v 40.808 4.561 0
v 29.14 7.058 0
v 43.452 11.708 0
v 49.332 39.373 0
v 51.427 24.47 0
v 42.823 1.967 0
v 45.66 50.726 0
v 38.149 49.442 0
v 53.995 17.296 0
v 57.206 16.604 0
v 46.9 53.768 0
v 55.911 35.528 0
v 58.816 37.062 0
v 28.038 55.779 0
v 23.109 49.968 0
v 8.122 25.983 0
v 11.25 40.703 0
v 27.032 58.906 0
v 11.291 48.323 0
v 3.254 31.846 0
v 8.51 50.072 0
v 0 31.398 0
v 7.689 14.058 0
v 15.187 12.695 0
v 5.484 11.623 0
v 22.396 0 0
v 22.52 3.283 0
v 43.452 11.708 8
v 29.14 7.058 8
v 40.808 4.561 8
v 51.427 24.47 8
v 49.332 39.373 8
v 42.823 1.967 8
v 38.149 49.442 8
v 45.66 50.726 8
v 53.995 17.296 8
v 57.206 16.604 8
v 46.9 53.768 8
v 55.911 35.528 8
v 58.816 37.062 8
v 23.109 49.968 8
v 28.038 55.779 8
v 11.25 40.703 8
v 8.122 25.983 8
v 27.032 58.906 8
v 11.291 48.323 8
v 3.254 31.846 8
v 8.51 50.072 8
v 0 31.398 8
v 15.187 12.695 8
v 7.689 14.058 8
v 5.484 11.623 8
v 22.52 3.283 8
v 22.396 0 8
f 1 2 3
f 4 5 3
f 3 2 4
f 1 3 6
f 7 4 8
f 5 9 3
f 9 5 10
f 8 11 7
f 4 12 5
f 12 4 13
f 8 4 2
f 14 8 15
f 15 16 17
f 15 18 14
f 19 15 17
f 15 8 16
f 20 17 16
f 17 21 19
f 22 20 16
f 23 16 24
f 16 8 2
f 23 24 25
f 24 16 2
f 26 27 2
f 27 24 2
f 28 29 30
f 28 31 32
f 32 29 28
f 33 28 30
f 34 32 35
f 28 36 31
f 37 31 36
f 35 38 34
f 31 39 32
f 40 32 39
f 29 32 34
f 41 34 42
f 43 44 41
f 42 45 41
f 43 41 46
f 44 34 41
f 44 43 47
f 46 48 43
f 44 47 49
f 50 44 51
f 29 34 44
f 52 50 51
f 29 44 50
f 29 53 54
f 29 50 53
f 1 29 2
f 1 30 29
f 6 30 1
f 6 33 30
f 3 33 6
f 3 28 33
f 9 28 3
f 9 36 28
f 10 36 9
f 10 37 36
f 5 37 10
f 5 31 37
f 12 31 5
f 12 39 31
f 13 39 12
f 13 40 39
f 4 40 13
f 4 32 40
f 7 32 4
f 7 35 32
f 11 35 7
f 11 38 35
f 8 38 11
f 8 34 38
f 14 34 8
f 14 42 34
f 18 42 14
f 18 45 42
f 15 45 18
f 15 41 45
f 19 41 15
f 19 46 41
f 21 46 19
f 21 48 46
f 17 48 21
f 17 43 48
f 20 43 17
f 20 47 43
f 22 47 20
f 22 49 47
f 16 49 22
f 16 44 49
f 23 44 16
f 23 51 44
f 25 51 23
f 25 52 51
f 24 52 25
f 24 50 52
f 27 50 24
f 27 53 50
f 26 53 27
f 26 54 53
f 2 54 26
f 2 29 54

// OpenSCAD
$fn = 32;

// ----------------------------------------------------------------------
// Fan rotor section: 9 blades, 22 mm hub radius, 8 mm blades
// ----------------------------------------------------------------------

// --- parameters (mm) ---
profile_height = 8;       // extrusion height
profile_points = 27;      // points of the closed outline

profile = [[51.427, 24.47], [55.911, 35.528], [58.816, 37.062], [49.332, 39.373], [45.66, 50.726], [46.9, 53.768], [38.149, 49.442], [28.038, 55.779], [27.032, 58.906], [23.109, 49.968], [11.291, 48.323], [8.51, 50.072], [11.25, 40.703], [3.254, 31.846], [0, 31.398], [8.122, 25.983], [7.689, 14.058], [5.484, 11.623], [15.187, 12.695], [22.52, 3.283], [22.396, 0], [29.14, 7.058], [40.808, 4.561], [42.823, 1.967], [43.452, 11.708], [53.995, 17.296], [57.206, 16.604]];  // single closed polygon, 27 points, counter clockwise

// --- the one profile operation ---
linear_extrude(height = profile_height) polygon(points = profile);
